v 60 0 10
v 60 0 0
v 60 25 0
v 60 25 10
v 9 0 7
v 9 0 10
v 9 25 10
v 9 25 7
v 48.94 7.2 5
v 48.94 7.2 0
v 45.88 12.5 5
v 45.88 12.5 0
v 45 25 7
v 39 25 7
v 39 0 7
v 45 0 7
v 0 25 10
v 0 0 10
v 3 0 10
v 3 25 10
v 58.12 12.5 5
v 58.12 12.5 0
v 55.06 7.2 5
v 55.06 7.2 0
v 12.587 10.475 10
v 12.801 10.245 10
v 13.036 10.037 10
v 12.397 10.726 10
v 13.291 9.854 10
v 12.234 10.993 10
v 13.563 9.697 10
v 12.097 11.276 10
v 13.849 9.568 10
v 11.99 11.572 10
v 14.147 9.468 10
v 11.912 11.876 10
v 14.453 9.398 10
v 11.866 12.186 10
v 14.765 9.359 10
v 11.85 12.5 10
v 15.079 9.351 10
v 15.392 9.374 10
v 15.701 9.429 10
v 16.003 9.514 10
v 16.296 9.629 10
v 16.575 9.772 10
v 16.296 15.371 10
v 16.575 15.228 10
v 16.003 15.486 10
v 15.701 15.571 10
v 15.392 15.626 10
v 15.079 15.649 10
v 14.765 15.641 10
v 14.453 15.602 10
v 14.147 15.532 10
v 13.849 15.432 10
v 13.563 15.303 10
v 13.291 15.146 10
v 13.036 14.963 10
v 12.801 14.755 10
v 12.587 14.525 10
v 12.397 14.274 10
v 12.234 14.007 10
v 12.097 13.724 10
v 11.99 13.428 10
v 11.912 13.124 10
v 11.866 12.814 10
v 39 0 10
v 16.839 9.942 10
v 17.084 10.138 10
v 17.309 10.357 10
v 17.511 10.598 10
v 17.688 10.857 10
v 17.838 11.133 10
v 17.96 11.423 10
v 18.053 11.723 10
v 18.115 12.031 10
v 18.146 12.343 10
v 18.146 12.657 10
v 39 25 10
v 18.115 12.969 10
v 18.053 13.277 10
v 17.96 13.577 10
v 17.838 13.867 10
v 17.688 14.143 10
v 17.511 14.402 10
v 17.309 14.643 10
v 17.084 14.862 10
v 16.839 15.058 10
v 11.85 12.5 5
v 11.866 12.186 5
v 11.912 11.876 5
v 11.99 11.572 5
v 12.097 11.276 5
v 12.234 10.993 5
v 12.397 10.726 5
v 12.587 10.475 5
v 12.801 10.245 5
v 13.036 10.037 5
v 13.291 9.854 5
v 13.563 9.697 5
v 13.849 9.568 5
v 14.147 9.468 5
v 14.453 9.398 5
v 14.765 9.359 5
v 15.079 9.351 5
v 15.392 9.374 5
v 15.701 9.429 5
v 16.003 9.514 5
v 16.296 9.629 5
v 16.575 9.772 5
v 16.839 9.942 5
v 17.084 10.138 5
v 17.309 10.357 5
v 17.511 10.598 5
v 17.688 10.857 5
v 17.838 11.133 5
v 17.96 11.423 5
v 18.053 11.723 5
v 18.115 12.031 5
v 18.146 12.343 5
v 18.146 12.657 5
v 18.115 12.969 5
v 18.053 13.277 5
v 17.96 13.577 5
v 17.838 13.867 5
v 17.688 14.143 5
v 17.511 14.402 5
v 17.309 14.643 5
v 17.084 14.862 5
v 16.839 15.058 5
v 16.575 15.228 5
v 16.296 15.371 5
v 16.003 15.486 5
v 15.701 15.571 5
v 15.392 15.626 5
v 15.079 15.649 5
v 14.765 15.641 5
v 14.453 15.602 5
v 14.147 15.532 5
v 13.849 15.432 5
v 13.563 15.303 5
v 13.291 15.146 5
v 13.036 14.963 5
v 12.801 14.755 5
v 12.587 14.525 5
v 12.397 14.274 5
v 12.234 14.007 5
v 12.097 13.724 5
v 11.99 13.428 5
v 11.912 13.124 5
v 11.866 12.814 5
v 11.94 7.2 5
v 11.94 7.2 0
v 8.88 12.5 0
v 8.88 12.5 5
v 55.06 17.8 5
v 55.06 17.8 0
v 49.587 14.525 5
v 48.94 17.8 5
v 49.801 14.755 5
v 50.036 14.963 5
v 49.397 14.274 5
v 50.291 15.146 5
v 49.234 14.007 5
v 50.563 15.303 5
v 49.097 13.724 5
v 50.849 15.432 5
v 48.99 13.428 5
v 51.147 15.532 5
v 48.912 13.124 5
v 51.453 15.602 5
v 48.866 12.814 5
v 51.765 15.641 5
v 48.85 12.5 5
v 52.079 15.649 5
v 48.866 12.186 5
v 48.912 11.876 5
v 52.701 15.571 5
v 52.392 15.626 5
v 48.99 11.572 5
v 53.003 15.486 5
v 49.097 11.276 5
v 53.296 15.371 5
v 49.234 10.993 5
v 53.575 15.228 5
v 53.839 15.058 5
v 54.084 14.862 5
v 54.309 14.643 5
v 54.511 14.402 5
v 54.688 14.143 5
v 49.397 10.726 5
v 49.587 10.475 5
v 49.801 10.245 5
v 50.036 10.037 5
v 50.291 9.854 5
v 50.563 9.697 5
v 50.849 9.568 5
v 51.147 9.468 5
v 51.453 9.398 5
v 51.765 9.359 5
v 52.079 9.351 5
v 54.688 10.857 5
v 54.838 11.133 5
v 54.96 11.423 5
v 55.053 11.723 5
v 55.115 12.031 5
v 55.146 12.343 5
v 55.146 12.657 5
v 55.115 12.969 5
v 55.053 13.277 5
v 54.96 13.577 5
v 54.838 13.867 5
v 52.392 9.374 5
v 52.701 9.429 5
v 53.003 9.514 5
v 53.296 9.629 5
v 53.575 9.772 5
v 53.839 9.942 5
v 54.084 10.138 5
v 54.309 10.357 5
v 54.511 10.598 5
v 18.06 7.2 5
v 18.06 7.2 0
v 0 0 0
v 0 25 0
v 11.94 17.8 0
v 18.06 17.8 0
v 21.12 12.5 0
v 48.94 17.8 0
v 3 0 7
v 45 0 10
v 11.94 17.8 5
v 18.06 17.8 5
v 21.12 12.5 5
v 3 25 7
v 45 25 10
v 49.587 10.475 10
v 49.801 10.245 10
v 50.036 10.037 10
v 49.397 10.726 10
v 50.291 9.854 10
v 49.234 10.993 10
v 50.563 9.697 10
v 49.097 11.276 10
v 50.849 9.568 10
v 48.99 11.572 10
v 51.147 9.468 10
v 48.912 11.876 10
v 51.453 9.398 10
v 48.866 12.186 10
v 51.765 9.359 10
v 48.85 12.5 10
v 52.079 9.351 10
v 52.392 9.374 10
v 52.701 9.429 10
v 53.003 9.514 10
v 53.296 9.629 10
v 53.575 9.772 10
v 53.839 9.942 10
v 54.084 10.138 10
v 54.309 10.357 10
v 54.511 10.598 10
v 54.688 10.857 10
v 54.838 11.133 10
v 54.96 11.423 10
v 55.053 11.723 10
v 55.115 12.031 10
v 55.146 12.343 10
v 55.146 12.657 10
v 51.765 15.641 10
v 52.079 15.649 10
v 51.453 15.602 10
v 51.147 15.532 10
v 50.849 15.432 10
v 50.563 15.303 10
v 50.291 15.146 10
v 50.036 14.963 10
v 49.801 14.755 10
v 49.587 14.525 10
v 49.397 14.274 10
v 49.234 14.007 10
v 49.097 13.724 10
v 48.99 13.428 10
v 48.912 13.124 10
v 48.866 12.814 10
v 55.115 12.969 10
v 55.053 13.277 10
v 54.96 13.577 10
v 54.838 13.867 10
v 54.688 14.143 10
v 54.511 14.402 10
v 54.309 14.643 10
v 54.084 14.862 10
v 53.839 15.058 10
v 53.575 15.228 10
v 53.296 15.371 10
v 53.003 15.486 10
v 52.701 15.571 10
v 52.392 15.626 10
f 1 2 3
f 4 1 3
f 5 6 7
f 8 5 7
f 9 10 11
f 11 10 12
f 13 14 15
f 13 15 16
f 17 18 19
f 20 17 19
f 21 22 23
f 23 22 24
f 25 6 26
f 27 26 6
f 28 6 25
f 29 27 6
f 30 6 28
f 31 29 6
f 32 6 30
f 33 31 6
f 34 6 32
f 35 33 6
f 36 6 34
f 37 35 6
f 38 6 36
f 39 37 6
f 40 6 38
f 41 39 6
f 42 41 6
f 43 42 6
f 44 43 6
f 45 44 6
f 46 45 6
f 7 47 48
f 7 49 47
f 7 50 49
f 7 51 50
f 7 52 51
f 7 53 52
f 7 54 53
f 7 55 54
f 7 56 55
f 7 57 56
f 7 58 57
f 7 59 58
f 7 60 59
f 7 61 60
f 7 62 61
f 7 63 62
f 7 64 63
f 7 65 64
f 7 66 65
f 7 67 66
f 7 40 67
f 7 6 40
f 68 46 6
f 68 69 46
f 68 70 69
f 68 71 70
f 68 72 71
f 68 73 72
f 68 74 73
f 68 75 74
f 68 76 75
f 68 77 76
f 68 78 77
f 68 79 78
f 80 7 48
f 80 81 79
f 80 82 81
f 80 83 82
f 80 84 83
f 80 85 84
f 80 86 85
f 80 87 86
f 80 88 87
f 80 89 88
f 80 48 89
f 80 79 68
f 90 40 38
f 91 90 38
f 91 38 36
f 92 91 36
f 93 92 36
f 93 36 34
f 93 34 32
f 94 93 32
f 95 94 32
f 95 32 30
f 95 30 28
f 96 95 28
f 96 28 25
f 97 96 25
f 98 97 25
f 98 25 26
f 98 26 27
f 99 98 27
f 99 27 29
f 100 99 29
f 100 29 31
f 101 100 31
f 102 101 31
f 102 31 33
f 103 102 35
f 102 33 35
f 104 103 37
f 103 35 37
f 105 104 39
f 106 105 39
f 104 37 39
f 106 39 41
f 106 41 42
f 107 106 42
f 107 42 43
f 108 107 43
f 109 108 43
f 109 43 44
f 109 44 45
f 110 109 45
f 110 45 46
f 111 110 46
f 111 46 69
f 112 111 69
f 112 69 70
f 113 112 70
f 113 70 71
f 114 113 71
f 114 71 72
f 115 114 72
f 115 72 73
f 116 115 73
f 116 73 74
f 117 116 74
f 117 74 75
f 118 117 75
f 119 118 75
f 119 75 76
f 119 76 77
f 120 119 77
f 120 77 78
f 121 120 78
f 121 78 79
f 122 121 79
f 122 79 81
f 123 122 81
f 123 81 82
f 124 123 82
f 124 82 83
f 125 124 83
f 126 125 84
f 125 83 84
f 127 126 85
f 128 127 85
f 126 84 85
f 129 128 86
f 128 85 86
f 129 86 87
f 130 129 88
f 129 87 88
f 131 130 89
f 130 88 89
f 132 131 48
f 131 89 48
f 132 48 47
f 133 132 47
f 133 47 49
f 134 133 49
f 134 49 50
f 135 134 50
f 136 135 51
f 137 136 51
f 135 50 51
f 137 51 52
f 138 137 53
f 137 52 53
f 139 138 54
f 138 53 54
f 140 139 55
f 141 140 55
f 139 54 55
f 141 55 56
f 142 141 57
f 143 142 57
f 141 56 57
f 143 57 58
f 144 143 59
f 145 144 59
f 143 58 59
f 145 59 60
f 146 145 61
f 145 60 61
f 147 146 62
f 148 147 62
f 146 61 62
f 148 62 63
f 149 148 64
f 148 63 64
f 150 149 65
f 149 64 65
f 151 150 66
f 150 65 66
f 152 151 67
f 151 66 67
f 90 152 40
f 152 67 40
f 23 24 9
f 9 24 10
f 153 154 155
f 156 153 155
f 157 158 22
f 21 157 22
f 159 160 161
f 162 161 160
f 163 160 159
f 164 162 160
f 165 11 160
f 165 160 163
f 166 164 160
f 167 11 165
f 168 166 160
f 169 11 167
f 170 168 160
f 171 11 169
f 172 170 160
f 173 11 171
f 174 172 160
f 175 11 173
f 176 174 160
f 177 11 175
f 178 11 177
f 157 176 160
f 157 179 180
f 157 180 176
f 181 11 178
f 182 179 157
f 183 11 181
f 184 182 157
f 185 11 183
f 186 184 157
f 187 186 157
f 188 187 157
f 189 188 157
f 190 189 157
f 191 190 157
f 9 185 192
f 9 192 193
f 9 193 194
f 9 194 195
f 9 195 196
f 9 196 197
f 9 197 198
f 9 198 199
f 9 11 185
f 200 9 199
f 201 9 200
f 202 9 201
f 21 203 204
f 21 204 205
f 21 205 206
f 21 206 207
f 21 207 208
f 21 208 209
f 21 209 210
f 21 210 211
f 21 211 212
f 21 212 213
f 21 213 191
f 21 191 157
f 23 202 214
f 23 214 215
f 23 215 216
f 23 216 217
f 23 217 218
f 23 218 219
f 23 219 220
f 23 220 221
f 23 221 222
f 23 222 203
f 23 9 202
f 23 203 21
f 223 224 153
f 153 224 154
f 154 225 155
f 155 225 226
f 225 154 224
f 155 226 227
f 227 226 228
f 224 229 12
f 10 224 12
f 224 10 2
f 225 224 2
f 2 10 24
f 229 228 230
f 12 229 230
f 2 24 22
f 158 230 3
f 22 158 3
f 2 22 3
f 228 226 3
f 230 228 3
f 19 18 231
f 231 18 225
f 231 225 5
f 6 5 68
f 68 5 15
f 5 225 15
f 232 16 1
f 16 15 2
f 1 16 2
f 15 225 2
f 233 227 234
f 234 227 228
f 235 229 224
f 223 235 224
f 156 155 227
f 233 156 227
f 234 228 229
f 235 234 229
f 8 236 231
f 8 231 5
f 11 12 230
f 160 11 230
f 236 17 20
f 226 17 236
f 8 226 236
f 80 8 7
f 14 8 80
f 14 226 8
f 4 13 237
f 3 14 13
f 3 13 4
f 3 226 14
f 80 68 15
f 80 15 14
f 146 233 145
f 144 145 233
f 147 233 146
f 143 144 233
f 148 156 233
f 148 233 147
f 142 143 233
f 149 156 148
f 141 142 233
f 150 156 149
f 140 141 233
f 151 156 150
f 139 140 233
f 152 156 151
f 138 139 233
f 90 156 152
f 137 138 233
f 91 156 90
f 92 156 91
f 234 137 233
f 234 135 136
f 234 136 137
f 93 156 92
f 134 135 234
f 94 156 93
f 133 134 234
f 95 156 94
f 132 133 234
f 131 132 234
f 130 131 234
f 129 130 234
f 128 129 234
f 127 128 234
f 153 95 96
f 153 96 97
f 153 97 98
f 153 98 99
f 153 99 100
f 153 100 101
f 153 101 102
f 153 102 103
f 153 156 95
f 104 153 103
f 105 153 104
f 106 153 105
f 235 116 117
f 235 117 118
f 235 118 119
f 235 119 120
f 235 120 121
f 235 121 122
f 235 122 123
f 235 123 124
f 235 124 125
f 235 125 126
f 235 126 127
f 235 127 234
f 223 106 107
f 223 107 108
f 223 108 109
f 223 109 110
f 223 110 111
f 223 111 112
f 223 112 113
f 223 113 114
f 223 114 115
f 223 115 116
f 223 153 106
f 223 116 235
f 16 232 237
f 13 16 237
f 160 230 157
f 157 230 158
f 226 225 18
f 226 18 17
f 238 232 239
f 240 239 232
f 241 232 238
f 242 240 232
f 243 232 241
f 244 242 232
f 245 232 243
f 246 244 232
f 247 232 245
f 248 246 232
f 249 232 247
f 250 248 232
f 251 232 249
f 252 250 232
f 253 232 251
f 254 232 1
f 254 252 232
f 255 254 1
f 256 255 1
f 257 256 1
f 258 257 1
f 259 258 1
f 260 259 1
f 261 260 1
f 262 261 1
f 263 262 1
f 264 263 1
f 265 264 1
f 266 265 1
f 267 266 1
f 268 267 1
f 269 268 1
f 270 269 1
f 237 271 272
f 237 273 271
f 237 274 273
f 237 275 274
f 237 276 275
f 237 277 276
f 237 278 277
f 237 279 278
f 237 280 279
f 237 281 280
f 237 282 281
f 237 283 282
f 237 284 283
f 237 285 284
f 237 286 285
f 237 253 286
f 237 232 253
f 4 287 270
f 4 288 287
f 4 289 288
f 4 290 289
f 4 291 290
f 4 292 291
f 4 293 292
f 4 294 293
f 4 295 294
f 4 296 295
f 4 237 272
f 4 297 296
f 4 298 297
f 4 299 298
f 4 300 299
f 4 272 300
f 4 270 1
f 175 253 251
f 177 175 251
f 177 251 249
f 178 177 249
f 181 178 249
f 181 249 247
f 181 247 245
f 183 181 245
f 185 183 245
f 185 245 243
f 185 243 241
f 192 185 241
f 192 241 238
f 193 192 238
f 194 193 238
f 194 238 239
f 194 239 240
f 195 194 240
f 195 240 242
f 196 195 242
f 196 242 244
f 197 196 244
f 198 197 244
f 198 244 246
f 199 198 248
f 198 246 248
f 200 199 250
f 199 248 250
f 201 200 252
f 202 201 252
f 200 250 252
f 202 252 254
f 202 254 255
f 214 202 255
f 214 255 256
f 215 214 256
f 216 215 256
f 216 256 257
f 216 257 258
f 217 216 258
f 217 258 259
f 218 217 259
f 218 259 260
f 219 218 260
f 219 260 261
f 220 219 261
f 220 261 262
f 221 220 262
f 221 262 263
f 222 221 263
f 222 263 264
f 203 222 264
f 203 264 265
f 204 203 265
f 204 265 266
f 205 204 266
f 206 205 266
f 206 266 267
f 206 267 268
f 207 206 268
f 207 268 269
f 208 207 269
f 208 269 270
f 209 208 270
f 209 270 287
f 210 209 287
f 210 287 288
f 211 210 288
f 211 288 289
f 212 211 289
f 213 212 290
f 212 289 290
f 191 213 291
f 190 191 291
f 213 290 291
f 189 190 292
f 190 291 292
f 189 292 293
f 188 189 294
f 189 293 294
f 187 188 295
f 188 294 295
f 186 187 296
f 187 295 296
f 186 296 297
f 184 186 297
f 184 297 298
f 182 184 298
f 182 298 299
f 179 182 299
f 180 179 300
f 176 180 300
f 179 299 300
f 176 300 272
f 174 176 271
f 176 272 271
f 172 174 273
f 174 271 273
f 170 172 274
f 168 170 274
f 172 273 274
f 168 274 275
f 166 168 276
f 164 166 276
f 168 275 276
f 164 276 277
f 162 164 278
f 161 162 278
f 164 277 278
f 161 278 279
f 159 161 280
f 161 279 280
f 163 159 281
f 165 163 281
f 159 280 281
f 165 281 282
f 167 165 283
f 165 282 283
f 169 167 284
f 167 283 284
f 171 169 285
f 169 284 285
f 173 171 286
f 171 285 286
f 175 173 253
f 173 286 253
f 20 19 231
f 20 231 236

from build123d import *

# Parameters (mm, degrees)
F0_W     = 60
F0_H     = 25
F1_DEPTH = 10
F2_W     = 6
F2_H     = 25
F3_DEPTH = 3
F6_D     = 6.3
F7_DEPTH = 5


with BuildPart() as f1:
    # F0 (on Top) → F1 (new body)
    with BuildSketch(Plane.XY):
        with Locations((30, 12.5)):
            Rectangle(F0_W, F0_H)
    extrude(amount=F1_DEPTH)

    # F2 (on face) → F3 (cut)
    with BuildSketch(Plane.XY.offset(10)):
        with Locations((6, 12.5)):
            Rectangle(F2_W, F2_H)
        with Locations((42, 12.5)):
            Rectangle(F2_W, F2_H)
    extrude(amount=-F3_DEPTH, mode=Mode.SUBTRACT)

    # F6 (through all)
    with Locations(Plane(origin=(0, 0, 0), x_dir=(1, 0, 0), z_dir=(0, 0, -1))):
        with Locations((15, -12.5), (52, -12.5)):
            Hole(F6_D / 2)

    # F5 (on face) → F7 (cut)
    with BuildSketch(Plane(origin=(0, 0, 0), x_dir=(1, 0, 0), z_dir=(0, 0, -1))):
        Polygon((21.119913, -12.5), (18.059956, -7.2), (11.940044, -7.2), (8.880087, -12.5), (11.940044, -17.8), (18.059956, -17.8), align=None)
        Polygon((45.880087, -12.5), (48.940044, -17.8), (55.059956, -17.8), (58.119913, -12.5), (55.059956, -7.2), (48.940044, -7.2), align=None)
    extrude(amount=-F7_DEPTH, mode=Mode.SUBTRACT)


solid = f1.part
